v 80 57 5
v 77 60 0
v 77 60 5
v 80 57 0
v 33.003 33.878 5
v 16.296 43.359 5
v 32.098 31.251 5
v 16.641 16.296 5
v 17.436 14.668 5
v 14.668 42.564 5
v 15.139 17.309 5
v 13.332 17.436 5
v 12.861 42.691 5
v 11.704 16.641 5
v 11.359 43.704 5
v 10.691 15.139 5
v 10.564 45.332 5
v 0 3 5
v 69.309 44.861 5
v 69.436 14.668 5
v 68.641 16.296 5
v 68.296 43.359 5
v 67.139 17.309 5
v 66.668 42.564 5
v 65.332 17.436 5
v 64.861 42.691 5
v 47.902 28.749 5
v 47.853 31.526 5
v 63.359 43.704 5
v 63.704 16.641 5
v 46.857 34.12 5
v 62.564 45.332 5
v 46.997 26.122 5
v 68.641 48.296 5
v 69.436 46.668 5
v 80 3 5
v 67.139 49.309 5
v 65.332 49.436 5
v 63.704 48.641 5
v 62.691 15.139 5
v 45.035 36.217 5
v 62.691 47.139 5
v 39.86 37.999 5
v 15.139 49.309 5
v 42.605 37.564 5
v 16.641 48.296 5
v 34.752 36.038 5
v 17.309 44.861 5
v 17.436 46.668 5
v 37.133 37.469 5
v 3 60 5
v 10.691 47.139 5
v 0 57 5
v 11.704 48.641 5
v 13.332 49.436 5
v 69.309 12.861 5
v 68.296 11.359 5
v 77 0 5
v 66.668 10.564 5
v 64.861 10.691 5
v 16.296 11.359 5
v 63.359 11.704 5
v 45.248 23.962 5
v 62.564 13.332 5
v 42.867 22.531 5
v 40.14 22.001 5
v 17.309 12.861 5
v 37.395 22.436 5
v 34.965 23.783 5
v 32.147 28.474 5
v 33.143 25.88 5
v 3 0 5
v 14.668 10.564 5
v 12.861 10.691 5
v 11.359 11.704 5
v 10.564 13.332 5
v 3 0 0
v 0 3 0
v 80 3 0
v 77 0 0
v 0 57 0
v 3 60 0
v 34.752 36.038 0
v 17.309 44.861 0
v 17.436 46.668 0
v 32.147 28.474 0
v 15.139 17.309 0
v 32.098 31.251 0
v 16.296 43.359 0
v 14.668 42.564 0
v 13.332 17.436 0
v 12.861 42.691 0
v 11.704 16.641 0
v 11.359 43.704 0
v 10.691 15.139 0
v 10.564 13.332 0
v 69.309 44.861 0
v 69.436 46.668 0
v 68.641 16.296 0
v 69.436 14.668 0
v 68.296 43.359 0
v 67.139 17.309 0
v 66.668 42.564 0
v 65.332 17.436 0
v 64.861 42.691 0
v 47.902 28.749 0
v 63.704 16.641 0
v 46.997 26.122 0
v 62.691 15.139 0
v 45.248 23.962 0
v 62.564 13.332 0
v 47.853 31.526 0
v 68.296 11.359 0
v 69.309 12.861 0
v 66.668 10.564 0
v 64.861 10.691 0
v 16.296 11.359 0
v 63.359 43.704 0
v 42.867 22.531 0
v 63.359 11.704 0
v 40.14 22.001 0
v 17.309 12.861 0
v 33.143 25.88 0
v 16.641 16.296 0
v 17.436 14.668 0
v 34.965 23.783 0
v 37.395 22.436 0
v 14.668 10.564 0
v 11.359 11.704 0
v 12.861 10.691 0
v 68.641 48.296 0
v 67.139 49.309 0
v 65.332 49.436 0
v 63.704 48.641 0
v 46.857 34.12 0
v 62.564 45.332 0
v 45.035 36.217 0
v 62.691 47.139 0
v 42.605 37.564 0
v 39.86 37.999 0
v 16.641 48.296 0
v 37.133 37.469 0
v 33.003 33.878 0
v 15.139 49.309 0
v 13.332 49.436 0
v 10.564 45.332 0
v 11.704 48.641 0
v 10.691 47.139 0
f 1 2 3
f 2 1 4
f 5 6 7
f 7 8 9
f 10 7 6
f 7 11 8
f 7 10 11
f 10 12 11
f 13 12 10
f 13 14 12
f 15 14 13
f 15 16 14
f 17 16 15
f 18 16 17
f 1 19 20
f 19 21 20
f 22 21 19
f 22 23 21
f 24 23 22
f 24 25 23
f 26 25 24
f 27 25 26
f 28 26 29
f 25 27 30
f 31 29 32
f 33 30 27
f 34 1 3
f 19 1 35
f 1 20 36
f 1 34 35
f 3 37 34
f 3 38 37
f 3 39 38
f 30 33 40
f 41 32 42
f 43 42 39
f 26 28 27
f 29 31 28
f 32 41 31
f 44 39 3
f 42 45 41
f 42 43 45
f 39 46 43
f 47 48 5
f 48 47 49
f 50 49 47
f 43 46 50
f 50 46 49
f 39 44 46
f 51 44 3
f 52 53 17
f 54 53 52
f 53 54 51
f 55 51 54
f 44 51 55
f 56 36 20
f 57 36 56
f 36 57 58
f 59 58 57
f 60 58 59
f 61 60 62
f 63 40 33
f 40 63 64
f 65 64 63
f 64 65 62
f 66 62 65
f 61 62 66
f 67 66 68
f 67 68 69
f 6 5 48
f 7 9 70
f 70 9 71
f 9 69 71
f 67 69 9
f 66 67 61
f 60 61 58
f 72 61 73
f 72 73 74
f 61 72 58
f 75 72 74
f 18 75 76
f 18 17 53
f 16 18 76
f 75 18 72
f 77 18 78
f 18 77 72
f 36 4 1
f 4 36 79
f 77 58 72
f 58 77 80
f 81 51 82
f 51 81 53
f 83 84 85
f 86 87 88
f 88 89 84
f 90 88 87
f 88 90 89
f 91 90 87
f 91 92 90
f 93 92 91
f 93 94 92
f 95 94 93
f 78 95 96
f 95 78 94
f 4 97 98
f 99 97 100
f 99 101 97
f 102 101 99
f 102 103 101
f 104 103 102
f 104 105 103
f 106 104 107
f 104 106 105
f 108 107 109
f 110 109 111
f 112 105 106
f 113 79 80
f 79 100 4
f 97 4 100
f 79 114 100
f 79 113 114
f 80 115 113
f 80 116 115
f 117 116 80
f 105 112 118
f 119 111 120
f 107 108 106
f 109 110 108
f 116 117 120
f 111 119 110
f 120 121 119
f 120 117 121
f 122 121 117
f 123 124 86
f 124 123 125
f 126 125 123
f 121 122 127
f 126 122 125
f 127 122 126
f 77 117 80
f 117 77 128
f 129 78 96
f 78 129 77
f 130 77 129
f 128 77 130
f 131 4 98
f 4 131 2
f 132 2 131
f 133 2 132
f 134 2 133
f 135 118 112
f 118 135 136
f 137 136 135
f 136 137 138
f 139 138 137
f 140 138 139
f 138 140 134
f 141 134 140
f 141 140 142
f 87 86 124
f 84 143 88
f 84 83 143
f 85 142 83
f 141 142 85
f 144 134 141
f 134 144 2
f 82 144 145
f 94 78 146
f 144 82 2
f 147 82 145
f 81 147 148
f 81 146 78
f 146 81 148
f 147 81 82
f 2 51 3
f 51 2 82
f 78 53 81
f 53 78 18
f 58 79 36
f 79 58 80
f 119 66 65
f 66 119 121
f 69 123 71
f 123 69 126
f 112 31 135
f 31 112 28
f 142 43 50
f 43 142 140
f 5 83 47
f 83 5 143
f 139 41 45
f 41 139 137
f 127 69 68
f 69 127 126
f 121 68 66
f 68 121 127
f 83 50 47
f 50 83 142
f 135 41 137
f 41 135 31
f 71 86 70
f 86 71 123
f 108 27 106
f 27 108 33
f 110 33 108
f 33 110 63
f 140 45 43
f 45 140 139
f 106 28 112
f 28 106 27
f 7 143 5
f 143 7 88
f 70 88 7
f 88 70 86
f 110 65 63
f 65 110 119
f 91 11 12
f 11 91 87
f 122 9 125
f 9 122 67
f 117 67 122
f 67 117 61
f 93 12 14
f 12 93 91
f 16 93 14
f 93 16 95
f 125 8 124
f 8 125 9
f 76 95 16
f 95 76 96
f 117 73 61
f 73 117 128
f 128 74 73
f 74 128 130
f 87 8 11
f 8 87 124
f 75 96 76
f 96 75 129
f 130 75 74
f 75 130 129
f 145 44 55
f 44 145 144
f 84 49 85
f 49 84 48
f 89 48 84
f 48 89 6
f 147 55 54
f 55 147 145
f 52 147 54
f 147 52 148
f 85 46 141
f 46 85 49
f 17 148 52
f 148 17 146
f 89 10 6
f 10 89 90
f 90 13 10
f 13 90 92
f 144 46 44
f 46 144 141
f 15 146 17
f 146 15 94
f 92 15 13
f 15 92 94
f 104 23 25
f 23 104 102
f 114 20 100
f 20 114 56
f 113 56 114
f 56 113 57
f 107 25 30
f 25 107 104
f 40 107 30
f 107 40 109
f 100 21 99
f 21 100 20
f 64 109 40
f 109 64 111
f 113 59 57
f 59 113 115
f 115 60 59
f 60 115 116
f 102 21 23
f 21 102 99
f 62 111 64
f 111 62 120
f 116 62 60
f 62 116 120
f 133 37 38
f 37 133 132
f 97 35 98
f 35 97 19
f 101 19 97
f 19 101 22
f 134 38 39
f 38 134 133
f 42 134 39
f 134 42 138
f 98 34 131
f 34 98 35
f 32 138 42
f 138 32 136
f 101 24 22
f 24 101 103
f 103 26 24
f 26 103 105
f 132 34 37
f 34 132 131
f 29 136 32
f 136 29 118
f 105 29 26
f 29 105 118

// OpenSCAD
$fn = 32;

// ----------------------------------------------------------------------
// Spacer plate: rect 80 x 60
// ----------------------------------------------------------------------

// --- parameters (mm) ---
bore_r = 8;               // centre bore radius
bolt_r = 3.5;             // bolt hole radius
plate_t = 5;              // plate thickness, Z (extrusion height)
plate_l = 80;             // plate length, X
plate_w = 60;             // plate width, Y
inset = 14;               // corner hole inset
fit_tol = 0.1;            // declared fit tolerance (prompt contract)
free_tol = 0.5;           // declared free tolerance (prompt contract)

profile = [[3, 0], [77, 0], [80, 3], [80, 57], [77, 60], [3, 60], [0, 57], [0, 3]];  // primary outline, 8 points, counter clockwise
void_1 = [[47.853, 31.526], [46.857, 34.12], [45.035, 36.217], [42.605, 37.564], [39.86, 37.999], [37.133, 37.469], [34.752, 36.038], [33.003, 33.878], [32.098, 31.251], [32.147, 28.474], [33.143, 25.88], [34.965, 23.783], [37.395, 22.436], [40.14, 22.001], [42.867, 22.531], [45.248, 23.962], [46.997, 26.122], [47.902, 28.749]];  // centre bore, 18 points
void_2 = [[17.436, 14.668], [16.641, 16.296], [15.139, 17.309], [13.332, 17.436], [11.704, 16.641], [10.691, 15.139], [10.564, 13.332], [11.359, 11.704], [12.861, 10.691], [14.668, 10.564], [16.296, 11.359], [17.309, 12.861]];  // corner hole, 12 points
void_3 = [[17.436, 46.668], [16.641, 48.296], [15.139, 49.309], [13.332, 49.436], [11.704, 48.641], [10.691, 47.139], [10.564, 45.332], [11.359, 43.704], [12.861, 42.691], [14.668, 42.564], [16.296, 43.359], [17.309, 44.861]];  // corner hole, 12 points
void_4 = [[69.436, 14.668], [68.641, 16.296], [67.139, 17.309], [65.332, 17.436], [63.704, 16.641], [62.691, 15.139], [62.564, 13.332], [63.359, 11.704], [64.861, 10.691], [66.668, 10.564], [68.296, 11.359], [69.309, 12.861]];  // corner hole, 12 points
void_5 = [[69.436, 46.668], [68.641, 48.296], [67.139, 49.309], [65.332, 49.436], [63.704, 48.641], [62.691, 47.139], [62.564, 45.332], [63.359, 43.704], [64.861, 42.691], [66.668, 42.564], [68.296, 43.359], [69.309, 44.861]];  // corner hole, 12 points

// --- the one profile operation ---
difference() {
  linear_extrude(height = plate_t) polygon(points = profile);
  translate([0, 0, -1])
    linear_extrude(height = plate_t + 2) polygon(points = void_1);
  translate([0, 0, -1])
    linear_extrude(height = plate_t + 2) polygon(points = void_2);
  translate([0, 0, -1])
    linear_extrude(height = plate_t + 2) polygon(points = void_3);
  translate([0, 0, -1])
    linear_extrude(height = plate_t + 2) polygon(points = void_4);
  translate([0, 0, -1])
    linear_extrude(height = plate_t + 2) polygon(points = void_5);
}
